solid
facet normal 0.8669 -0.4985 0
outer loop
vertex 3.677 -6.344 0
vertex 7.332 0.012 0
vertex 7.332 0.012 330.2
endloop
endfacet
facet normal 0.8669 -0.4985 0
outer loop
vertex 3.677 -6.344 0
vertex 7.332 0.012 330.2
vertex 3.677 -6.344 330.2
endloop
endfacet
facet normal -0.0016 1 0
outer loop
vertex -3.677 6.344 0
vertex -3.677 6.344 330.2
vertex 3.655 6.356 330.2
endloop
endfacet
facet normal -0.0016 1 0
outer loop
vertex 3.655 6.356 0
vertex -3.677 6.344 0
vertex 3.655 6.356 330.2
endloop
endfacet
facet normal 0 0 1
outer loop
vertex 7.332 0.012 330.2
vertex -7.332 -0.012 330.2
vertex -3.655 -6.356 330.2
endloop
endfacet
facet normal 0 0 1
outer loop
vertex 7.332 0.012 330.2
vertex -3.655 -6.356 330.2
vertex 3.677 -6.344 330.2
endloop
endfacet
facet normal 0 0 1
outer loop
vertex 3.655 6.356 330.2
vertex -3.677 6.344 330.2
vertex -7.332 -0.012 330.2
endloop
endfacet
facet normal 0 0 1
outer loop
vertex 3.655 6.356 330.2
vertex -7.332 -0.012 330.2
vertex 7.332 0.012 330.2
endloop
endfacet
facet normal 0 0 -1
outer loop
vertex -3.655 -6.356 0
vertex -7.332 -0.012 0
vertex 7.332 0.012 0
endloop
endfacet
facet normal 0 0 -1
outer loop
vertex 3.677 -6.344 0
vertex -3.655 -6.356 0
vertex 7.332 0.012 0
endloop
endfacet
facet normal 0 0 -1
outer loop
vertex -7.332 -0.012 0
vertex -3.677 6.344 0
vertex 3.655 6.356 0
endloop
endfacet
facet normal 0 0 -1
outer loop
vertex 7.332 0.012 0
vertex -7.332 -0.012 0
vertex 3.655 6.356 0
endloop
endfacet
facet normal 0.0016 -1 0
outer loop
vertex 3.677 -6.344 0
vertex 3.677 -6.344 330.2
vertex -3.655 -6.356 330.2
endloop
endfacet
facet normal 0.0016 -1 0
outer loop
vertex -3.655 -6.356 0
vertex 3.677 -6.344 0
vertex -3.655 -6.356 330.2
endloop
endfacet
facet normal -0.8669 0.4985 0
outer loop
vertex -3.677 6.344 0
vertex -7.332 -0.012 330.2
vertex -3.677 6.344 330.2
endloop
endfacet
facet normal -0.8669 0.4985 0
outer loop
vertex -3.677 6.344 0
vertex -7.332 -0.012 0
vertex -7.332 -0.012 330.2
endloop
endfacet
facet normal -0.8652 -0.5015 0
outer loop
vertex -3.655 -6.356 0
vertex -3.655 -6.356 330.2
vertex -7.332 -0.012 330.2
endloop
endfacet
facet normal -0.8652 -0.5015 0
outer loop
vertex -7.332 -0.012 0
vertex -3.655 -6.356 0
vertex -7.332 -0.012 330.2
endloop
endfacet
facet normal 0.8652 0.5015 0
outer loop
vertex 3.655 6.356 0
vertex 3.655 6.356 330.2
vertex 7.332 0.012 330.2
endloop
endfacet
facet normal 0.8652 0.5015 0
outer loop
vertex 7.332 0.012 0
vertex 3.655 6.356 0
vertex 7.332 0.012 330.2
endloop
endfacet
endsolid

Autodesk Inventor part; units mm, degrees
ref_plane "YZ Plane" through (0, 0, 0) normal (1, 0, 0) x (0, 1, 0)
ref_plane "XZ Plane" through (0, 0, 0) normal (0, 1, 0) x (-1, 0, 0)
ref_plane "XY Plane" through (0, 0, 0) normal (0, 0, 1) x (1, 0, 0)
sketch "Sketch1" plane through (0, 0, 0) normal (0, 0, 1) x (1, 0, 0)
  line L0 (3.6554, 6.3562) -> (7.3323, 0.0125)
  line L1 (7.3323, 0.0125) -> (3.677, -6.3438)
  line L2 (3.677, -6.3438) -> (-3.6554, -6.3562)
  line L3 (-3.6554, -6.3562) -> (-7.3323, -0.0125)
  line L4 (-7.3323, -0.0125) -> (-3.677, 6.3438)
  line L5 (-3.677, 6.3438) -> (3.6554, 6.3562)
  point P0 (0, 0)
  point P1 (0, 0)
  dimension "d0" = 12.7
extrude "Extrusion1" add sketch "Sketch1" along normal blind 330.2
properties part number "CAR_035_KickerShaft" material "Aluminum 6061"
